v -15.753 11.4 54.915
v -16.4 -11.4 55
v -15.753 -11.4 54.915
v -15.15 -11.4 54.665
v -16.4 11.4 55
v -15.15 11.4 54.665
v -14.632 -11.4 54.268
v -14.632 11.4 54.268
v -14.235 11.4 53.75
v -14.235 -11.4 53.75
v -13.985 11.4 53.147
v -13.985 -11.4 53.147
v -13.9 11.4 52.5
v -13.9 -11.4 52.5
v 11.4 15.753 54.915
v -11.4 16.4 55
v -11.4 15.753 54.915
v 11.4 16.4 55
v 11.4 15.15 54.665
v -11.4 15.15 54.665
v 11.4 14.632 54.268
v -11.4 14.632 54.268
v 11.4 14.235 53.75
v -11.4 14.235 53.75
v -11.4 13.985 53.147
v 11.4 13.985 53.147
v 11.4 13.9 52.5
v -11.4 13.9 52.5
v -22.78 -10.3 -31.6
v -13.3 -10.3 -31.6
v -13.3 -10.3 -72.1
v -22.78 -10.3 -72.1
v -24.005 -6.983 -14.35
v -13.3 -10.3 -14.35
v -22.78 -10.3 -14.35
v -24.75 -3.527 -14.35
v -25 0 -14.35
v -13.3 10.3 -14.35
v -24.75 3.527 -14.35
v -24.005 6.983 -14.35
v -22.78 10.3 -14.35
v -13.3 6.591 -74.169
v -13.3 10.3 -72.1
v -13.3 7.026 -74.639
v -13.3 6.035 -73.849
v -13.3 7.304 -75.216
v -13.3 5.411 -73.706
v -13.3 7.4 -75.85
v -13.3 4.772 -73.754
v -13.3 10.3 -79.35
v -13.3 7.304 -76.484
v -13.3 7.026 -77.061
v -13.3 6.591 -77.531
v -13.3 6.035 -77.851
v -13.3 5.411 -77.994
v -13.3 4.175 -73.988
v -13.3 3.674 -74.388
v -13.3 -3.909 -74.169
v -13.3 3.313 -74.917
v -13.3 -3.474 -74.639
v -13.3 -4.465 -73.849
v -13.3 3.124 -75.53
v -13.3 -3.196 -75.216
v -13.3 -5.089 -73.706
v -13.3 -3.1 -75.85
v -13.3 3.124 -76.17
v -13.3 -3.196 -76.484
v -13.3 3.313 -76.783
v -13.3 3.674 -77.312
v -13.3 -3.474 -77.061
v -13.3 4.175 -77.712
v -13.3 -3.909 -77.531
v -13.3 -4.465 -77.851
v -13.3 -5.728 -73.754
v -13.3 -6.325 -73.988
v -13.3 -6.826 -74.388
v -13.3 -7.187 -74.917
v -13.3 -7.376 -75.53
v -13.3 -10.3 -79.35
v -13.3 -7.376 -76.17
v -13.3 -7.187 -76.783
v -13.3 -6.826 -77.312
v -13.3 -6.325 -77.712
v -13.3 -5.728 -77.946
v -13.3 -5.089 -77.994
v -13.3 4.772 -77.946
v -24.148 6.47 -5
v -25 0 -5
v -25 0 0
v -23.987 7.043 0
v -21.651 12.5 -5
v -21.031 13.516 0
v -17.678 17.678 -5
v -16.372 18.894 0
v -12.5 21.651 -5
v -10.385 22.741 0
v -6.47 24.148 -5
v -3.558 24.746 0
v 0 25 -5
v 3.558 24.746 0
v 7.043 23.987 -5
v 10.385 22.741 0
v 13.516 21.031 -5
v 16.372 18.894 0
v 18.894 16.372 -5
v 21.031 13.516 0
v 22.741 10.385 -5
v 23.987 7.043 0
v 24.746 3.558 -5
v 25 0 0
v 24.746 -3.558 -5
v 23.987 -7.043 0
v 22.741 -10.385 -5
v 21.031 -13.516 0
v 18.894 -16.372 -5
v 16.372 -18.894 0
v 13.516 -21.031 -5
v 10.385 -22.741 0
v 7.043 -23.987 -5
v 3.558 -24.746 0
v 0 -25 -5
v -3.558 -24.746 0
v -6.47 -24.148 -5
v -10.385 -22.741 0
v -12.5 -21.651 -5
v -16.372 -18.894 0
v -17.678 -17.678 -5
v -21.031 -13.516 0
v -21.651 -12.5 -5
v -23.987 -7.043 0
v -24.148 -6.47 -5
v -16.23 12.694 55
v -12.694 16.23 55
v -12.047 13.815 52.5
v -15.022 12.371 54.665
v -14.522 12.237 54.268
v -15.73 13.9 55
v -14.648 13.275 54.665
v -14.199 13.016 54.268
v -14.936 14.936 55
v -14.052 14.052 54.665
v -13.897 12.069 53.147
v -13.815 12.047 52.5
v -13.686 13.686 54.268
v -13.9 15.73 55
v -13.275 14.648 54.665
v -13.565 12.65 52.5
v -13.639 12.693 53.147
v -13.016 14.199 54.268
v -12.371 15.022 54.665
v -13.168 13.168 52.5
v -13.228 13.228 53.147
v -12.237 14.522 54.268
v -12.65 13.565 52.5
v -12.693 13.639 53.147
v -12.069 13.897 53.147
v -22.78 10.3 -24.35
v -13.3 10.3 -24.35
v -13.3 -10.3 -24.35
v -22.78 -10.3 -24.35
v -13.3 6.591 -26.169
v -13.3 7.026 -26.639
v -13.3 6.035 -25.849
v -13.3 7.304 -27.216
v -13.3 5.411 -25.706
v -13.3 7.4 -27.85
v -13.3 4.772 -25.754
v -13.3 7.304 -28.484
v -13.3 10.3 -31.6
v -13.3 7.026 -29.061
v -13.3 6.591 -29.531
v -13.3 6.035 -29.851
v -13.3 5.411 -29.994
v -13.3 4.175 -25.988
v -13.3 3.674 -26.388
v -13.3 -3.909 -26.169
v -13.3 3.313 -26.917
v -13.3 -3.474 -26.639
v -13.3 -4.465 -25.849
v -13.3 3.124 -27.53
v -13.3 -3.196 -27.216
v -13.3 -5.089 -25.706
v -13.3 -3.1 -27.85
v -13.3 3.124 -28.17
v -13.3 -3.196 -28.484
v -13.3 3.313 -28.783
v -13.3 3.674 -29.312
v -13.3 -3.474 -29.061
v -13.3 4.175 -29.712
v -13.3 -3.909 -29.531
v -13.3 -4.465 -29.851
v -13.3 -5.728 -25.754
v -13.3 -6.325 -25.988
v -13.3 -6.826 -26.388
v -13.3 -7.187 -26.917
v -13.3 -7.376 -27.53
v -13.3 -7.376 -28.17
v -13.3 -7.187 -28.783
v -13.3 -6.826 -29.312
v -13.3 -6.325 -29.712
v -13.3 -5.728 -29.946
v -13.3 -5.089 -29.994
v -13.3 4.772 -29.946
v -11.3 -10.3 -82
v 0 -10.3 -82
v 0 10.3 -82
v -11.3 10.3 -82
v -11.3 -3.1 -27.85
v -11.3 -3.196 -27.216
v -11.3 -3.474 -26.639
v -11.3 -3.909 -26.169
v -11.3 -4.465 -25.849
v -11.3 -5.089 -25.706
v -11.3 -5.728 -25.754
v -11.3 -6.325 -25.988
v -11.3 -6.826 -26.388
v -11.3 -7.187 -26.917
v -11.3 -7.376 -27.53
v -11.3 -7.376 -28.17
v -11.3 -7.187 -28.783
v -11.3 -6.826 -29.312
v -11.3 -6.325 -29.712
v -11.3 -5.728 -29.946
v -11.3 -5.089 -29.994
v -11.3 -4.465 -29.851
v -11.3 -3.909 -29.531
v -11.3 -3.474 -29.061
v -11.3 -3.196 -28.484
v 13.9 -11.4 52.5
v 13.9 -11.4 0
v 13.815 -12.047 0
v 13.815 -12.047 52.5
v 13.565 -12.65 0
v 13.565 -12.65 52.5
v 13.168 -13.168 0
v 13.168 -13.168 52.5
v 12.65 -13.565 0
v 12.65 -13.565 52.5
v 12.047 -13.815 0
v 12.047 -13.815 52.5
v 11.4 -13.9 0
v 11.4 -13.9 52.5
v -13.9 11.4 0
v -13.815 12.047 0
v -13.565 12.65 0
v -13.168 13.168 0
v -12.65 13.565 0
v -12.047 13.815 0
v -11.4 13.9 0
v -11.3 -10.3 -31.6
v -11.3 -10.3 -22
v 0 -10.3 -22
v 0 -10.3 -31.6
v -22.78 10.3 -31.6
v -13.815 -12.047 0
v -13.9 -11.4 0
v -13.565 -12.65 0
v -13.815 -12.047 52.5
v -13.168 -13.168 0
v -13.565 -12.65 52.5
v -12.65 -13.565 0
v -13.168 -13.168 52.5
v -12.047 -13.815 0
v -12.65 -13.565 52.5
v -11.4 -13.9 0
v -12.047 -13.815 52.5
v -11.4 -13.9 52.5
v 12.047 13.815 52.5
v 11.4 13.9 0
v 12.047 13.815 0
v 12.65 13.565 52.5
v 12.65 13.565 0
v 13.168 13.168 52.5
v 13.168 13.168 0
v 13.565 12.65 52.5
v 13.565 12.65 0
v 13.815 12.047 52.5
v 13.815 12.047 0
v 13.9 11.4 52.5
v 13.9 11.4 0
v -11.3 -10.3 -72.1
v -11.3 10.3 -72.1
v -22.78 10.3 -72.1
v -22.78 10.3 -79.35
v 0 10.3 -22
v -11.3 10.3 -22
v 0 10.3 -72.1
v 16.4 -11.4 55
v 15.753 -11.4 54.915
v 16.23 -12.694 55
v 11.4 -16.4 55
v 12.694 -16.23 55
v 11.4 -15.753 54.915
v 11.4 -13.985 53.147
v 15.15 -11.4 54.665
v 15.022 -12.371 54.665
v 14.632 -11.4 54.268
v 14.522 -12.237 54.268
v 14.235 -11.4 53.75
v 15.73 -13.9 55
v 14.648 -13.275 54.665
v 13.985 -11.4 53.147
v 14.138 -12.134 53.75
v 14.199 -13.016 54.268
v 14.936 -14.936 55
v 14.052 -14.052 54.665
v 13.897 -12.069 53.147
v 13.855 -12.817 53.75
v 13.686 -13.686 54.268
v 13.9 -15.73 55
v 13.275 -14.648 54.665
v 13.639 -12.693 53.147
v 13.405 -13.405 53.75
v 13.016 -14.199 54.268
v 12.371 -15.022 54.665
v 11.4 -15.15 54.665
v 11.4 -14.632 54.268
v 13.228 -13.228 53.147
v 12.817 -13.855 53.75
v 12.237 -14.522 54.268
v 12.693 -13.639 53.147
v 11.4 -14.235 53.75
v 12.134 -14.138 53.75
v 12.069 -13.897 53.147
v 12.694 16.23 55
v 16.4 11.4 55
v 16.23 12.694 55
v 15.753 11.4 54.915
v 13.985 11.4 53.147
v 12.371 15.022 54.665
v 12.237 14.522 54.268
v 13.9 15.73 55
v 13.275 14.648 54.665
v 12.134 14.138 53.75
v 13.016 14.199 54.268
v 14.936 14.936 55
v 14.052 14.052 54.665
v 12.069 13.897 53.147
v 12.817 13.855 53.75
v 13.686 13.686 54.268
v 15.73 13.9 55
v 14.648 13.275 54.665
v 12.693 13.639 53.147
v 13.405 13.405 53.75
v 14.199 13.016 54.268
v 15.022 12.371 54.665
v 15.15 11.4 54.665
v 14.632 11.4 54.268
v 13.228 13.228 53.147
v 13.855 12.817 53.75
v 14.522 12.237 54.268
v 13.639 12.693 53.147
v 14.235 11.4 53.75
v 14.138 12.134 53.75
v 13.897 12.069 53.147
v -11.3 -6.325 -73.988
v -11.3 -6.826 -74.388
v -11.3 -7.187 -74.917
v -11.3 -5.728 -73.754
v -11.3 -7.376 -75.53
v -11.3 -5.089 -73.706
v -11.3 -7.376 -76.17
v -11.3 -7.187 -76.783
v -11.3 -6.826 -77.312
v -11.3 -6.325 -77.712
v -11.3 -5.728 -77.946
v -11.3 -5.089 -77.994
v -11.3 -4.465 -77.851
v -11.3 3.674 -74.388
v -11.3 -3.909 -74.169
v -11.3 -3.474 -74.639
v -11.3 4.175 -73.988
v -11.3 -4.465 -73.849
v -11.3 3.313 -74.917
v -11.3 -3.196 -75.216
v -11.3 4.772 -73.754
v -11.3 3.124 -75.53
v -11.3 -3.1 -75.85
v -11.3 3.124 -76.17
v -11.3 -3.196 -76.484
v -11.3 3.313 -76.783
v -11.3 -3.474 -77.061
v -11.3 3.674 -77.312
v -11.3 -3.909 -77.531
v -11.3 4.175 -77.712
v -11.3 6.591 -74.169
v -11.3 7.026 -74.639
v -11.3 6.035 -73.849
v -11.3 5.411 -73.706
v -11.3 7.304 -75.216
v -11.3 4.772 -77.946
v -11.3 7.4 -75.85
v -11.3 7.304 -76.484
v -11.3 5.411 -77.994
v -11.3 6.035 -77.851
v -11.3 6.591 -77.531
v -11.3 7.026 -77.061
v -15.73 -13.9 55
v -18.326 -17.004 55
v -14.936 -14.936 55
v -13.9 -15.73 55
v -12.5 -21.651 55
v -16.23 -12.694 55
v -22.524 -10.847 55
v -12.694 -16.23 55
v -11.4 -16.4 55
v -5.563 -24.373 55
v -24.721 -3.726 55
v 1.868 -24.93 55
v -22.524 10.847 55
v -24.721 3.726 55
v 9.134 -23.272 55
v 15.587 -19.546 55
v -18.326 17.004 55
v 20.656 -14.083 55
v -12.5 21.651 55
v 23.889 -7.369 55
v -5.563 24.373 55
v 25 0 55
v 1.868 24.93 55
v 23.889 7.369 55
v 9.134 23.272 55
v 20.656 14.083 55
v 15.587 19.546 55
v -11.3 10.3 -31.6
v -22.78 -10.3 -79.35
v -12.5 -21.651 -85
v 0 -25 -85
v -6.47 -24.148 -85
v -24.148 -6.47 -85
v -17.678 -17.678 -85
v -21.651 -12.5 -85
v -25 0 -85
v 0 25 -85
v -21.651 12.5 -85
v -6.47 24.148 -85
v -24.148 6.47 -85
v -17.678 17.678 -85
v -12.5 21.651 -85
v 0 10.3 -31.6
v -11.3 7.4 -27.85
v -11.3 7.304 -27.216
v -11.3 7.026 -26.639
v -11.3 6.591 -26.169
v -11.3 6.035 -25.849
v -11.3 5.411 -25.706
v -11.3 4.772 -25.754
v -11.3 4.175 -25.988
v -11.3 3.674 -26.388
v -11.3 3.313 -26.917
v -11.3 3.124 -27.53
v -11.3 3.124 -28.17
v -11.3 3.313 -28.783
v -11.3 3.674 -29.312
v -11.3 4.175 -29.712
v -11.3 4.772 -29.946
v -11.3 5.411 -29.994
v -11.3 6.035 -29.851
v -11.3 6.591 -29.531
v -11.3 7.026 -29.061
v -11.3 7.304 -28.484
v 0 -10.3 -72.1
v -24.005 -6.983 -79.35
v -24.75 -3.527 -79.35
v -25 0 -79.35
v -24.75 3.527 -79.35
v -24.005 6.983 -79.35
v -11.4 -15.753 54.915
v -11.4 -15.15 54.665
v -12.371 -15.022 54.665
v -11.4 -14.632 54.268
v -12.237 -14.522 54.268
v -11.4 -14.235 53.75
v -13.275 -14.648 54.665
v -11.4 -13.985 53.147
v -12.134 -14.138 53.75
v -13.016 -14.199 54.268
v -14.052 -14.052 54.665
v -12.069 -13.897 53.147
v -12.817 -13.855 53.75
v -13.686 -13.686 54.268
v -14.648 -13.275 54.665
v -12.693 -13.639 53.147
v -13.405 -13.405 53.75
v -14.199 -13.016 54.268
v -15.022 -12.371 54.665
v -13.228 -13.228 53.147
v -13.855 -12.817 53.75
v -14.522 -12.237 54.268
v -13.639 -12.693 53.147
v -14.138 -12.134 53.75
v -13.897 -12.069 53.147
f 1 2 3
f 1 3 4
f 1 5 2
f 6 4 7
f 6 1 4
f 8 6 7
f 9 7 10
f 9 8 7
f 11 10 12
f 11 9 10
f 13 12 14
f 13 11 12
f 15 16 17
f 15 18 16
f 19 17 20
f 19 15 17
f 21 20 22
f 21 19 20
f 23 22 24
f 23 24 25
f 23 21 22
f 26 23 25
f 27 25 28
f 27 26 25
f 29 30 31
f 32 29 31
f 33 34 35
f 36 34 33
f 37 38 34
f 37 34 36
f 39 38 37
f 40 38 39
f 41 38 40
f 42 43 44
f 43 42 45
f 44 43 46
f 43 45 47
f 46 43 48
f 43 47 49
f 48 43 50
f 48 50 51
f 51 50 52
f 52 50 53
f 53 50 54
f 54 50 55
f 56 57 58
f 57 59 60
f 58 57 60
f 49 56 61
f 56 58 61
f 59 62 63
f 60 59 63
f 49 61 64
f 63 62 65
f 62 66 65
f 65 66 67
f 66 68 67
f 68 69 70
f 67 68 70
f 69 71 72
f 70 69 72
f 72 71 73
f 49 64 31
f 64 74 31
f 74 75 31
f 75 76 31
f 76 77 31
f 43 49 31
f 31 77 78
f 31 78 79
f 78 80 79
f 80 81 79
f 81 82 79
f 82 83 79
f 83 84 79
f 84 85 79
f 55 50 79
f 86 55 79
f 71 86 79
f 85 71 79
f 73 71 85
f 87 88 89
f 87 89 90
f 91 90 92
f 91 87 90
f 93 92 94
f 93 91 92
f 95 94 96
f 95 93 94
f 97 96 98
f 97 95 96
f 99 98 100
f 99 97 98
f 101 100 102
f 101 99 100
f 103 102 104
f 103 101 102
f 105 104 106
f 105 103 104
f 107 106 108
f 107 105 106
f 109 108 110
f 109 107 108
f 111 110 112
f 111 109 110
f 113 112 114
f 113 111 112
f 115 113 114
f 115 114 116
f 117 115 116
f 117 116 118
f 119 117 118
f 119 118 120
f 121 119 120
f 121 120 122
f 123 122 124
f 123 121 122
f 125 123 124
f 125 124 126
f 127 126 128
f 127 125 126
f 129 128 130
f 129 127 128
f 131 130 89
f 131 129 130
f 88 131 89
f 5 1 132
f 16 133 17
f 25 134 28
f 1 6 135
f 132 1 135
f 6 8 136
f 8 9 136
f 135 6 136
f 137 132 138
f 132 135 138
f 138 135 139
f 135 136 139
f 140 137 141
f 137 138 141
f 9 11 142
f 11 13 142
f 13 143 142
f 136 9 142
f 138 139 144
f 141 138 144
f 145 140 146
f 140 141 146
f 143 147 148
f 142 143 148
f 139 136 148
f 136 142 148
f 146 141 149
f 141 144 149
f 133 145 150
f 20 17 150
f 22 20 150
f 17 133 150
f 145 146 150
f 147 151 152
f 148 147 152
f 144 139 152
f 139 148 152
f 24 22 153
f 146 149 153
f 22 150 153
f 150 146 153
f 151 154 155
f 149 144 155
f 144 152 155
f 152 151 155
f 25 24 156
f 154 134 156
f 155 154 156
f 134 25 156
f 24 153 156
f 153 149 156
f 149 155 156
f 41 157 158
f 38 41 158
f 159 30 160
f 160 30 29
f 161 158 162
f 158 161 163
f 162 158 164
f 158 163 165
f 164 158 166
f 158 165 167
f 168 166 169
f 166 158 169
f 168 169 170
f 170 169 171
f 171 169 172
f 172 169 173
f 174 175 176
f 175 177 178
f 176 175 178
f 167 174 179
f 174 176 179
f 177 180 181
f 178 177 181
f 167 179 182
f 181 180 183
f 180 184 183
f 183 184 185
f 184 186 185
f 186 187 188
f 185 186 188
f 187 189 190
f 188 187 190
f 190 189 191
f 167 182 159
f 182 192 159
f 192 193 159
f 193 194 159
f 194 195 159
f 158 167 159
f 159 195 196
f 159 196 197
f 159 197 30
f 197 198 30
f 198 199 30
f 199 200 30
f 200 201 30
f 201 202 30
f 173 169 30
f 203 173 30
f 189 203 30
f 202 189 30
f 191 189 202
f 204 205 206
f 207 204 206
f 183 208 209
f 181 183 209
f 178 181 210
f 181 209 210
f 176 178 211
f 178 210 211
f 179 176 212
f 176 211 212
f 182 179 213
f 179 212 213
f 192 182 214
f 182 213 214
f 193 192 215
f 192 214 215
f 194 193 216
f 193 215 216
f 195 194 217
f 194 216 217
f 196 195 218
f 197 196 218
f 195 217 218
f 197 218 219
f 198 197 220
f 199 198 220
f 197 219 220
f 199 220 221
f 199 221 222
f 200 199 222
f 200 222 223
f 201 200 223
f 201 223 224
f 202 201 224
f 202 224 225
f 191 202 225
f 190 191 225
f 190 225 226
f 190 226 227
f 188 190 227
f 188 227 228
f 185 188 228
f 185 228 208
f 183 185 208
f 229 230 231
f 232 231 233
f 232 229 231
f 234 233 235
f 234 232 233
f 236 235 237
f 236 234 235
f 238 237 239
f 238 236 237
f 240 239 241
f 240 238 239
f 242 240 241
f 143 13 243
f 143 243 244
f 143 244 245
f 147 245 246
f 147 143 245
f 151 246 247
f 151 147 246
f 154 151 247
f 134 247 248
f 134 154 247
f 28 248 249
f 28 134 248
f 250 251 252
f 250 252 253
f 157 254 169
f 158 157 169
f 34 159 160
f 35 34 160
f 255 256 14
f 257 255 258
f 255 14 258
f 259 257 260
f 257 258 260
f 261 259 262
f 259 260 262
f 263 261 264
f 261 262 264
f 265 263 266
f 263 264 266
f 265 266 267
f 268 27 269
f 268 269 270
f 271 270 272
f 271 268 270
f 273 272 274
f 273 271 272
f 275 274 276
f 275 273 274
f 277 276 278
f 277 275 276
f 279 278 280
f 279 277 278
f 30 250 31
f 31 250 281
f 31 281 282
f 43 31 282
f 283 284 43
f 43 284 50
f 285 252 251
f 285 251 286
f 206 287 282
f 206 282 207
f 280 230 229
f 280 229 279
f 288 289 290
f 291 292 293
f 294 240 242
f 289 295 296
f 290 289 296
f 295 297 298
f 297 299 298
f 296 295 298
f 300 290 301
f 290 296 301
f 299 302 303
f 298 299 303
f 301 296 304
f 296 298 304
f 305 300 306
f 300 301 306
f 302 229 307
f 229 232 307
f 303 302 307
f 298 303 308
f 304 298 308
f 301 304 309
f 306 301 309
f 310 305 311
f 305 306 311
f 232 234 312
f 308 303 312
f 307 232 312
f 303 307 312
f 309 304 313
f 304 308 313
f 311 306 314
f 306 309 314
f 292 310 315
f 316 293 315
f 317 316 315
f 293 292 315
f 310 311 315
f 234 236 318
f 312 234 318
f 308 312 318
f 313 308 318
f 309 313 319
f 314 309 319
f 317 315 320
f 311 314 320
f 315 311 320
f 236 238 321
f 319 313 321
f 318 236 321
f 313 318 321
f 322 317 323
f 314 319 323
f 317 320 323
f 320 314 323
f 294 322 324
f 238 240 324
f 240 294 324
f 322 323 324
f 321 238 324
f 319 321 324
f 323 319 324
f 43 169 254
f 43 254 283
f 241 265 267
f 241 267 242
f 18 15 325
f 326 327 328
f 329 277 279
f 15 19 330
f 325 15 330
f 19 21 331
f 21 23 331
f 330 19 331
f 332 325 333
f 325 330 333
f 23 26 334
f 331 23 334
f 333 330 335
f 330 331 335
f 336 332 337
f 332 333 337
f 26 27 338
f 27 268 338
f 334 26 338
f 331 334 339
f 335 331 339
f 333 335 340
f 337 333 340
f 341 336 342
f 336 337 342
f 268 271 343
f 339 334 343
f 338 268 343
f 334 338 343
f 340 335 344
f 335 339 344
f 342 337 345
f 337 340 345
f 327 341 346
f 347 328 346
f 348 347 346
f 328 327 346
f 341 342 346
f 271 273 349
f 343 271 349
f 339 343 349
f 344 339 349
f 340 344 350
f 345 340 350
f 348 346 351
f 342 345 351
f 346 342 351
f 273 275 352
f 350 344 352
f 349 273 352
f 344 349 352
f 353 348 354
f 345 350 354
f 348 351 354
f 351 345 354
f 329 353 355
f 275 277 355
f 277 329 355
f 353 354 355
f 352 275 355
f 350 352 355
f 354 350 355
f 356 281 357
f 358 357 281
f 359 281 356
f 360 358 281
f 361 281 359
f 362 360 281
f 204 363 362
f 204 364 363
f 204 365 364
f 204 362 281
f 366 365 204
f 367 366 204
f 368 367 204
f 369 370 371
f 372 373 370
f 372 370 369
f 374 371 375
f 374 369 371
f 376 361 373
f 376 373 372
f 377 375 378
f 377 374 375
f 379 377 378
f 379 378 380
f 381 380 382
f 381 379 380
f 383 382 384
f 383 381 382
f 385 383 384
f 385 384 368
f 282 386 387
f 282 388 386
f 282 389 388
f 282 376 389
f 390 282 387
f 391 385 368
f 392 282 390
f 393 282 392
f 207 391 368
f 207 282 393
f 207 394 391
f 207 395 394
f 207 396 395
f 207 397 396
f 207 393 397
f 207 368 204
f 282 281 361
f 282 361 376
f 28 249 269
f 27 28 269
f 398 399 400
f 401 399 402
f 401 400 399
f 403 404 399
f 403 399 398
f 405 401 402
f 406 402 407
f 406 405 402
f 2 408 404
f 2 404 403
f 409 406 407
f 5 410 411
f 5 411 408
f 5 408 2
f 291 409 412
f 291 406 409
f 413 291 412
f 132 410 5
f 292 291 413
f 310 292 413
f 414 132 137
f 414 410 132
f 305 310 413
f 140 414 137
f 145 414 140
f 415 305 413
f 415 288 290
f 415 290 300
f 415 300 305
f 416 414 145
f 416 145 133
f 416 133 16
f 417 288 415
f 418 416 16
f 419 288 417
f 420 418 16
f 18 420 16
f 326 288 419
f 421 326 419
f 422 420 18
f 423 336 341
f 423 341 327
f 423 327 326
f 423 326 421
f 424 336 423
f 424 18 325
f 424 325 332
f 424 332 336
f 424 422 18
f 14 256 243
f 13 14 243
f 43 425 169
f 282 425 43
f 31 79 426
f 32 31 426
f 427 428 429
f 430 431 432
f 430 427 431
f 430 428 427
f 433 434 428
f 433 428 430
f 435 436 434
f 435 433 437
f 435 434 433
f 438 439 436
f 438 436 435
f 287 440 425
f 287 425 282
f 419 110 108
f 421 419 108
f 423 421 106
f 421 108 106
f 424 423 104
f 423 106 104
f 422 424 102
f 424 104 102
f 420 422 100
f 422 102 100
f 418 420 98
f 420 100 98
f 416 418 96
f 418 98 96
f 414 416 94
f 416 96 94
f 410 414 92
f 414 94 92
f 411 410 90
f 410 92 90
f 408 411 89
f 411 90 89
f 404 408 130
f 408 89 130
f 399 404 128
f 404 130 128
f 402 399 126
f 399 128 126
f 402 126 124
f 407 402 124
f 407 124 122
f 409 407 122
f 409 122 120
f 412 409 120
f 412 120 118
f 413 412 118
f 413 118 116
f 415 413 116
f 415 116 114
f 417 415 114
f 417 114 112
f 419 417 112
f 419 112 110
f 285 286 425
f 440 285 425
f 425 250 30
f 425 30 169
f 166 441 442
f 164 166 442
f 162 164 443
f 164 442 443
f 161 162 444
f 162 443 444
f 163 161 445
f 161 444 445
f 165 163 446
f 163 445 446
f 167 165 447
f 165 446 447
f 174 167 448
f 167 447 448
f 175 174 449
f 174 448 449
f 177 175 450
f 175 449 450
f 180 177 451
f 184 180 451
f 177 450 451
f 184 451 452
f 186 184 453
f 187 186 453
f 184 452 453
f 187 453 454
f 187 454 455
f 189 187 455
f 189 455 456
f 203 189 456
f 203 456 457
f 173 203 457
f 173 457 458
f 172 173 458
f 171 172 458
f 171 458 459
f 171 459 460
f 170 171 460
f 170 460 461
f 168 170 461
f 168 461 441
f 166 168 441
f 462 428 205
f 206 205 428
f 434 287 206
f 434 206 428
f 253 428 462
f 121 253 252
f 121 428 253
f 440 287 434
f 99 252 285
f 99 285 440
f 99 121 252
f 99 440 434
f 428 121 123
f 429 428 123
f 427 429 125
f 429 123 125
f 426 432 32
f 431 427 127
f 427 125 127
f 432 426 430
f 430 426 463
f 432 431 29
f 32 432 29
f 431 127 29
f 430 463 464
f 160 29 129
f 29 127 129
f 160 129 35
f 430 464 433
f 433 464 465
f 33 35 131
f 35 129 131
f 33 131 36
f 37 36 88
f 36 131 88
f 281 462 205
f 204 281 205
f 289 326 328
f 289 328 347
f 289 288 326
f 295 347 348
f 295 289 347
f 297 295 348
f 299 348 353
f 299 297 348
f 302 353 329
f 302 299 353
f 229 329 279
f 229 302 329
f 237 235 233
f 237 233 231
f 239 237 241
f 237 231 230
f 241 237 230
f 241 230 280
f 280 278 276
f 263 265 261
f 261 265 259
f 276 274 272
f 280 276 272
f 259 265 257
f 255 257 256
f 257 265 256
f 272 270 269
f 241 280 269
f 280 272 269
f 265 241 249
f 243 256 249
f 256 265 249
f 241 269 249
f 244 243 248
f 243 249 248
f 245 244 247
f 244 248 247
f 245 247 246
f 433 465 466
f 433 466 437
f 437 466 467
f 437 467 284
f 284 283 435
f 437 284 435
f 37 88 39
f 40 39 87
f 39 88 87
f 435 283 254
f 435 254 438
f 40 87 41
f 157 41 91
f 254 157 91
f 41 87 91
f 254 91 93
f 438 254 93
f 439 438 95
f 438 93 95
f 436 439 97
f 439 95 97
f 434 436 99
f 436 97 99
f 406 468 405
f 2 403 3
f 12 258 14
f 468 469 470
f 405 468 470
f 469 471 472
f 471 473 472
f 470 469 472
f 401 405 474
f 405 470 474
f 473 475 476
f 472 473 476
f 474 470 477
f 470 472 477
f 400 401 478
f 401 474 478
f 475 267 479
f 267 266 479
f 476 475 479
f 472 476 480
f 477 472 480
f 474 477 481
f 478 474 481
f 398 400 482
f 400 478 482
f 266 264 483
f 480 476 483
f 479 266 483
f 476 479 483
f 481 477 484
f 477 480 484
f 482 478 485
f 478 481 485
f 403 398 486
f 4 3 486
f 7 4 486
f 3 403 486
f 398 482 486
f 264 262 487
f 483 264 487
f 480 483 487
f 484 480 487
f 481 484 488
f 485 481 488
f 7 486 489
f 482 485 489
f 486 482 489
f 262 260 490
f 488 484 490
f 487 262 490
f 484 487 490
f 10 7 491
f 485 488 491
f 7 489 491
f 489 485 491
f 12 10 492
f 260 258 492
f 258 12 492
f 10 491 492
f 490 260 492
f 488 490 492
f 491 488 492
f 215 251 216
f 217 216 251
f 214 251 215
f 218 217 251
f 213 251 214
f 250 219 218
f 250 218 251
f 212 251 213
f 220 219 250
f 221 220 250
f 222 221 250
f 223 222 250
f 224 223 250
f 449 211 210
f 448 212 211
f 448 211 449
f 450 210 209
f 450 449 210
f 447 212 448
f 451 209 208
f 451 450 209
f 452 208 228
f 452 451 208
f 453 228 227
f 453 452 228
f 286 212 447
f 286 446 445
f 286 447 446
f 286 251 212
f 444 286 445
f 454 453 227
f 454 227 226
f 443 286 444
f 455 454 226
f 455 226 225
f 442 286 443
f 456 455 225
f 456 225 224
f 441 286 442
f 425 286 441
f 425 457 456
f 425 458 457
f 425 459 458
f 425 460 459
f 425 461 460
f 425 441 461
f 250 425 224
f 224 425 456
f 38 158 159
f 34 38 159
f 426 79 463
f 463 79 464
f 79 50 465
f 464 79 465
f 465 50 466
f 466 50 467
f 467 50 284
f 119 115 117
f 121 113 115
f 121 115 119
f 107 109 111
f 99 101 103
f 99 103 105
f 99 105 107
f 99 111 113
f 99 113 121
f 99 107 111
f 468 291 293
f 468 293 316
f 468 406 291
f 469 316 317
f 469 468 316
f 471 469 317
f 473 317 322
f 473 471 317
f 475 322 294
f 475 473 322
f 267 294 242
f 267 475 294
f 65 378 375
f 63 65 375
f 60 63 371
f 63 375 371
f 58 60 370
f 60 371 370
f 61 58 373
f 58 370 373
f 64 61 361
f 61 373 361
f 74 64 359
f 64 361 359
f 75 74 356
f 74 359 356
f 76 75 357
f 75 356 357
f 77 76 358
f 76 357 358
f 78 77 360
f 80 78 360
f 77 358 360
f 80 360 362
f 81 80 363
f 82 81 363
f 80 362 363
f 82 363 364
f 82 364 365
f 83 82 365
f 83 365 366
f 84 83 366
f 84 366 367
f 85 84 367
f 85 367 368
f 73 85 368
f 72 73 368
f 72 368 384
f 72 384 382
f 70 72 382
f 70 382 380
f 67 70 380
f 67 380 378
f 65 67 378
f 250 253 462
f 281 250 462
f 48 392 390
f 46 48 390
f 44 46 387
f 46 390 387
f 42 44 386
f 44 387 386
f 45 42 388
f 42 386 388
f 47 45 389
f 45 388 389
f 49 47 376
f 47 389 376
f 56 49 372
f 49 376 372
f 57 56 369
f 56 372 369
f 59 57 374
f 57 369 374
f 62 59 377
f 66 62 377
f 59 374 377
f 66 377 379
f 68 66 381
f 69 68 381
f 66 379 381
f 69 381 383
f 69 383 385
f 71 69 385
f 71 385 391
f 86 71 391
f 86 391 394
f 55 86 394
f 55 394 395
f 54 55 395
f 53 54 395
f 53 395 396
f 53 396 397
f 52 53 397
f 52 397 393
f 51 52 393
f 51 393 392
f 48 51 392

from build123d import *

# Parameters (mm, degrees)
SKETCH1_R           = 25
SKETCH1_W           = 27.8
SKETCH1_H           = 27.8
BOSS_EXTRUDE1_DEPTH = 55
BOSS_EXTRUDE2_START = 5
SKETCH2_R           = 25
SKETCH2_W           = 27.8
SKETCH2_H           = 27.8
BOSS_EXTRUDE2_DEPTH = 5
SKETCH3_W           = 25
SKETCH3_H           = 50
BOSS_EXTRUDE3_DEPTH = 80
FILLET1_R           = 2.5
FILLET2_R           = 2.5
SKETCH21_W          = 60
SKETCH21_H          = 20.6
CUT_EXTRUDE1_DEPTH  = 11.3
SKETCH22_W          = 40.5
SKETCH22_H          = 20.6
CUT_EXTRUDE2_DEPTH  = 93.059763198
CUT_EXTRUDE3_DEPTH  = 88.464278423
SKETCH23_R          = 2.15
CUT_EXTRUDE4_DEPTH  = 93.059763198
CUT_EXTRUDE7_DEPTH  = 27.5
CUT_EXTRUDE8_DEPTH  = 10


with BuildPart() as part:
    # Sketch1 → Boss-Extrude1 (new body)
    with BuildSketch(Plane.XY):
        Circle(SKETCH1_R)
        Rectangle(SKETCH1_W, SKETCH1_H, mode=Mode.SUBTRACT)
    extrude(amount=BOSS_EXTRUDE1_DEPTH)

    # Sketch2 → Boss-Extrude2 (add)
    # profile 1 of 2: a face of its own
    with BuildSketch(Plane(origin=(0, 0, 0), x_dir=(-1, 0, 0), z_dir=(0, 0, -1)).offset(BOSS_EXTRUDE2_START)):
        Circle(SKETCH2_R)
        Rectangle(SKETCH2_W, SKETCH2_H, mode=Mode.SUBTRACT)
    # profile 2 of 2: a face of its own
    with BuildSketch(Plane(origin=(0, 0, 0), x_dir=(-1, 0, 0), z_dir=(0, 0, -1)).offset(BOSS_EXTRUDE2_START)):
        Rectangle(SKETCH2_W, SKETCH2_H)
    extrude(amount=-BOSS_EXTRUDE2_DEPTH)

    # Sketch3 → Boss-Extrude3 (add)
    with BuildSketch(Plane(origin=(0, 0, -5), x_dir=(-1, 0, 0), z_dir=(0, 0, -1))):
        with Locations((12.5, 0)):
            Rectangle(SKETCH3_W, SKETCH3_H)
    extrude(amount=BOSS_EXTRUDE3_DEPTH)

    # Fillet1
    fillet1_edges = [part.edges().sort_by_distance(p)[0] for p in [
        (-13.9, 13.9, 27.5),
        (-13.9, -13.9, 27.5),
        (13.9, -13.9, 27.5),
        (13.9, 13.9, 27.5),
    ]]
    fillet(fillet1_edges, radius=FILLET1_R)

    # Fillet2
    fillet2_edges = [part.edges().sort_by_distance(p)[0] for p in [
        (0, 13.9, 55),
        (-13.9, 0, 55),
        (0, -13.9, 55),
        (13.9, 0, 55),
        (-13.167766953, 13.167766953, 55),
        (-13.167766953, -13.167766953, 55),
        (13.167766953, -13.167766953, 55),
        (13.167766953, 13.167766953, 55),
    ]]
    fillet(fillet2_edges, radius=FILLET2_R)

    # Sketch21 → Cut-Extrude1 (cut)
    with BuildSketch(Plane(origin=(0, 0, 0), x_dir=(0, 0, -1), z_dir=(1, 0, 0))):
        with Locations((52, 0)):
            Rectangle(SKETCH21_W, SKETCH21_H)
    extrude(amount=-CUT_EXTRUDE1_DEPTH, mode=Mode.SUBTRACT)

    # Sketch22 → Cut-Extrude2 (cut, through all)
    with BuildSketch(Plane(origin=(0, 0, 0), x_dir=(0, 0, -1), z_dir=(1, 0, 0))):
        with Locations((51.85, 0)):
            Rectangle(SKETCH22_W, SKETCH22_H)
    extrude(amount=-CUT_EXTRUDE2_DEPTH, mode=Mode.SUBTRACT)

    # Sketch18 → Cut-Extrude3 (cut, through all)
    with BuildSketch(Plane.XY.offset(-5)):
        with BuildLine():
            Line((-25, -25), (0, -25))
            ThreePointArc((0, -25), (-17.67766953, -17.67766953), (-25, 0))
            Line((-25, 0), (-25, -25))
        make_face()
        with BuildLine():
            Line((-25, 25), (-25, 0))
            ThreePointArc((-25, 0), (-17.67766953, 17.67766953), (0, 25))
            Line((0, 25), (-25, 25))
        make_face()
    extrude(amount=-CUT_EXTRUDE3_DEPTH, mode=Mode.SUBTRACT)

    # Sketch23 → Cut-Extrude4 (cut, through all)
    with BuildSketch(Plane(origin=(0, 0, 0), x_dir=(0, 0, -1), z_dir=(1, 0, 0))):
        with Locations(Location((27.85, -5.25, 0), (0, 0, 90))):
            Circle(SKETCH23_R)
        with Locations(Location((75.85, 5.25, 0), (0, 0, 90))):
            Circle(SKETCH23_R)
        with Locations(Location((75.85, -5.25, 0), (0, 0, 90))):
            Circle(SKETCH23_R)
        with Locations(Location((27.85, 5.25, 0), (0, 0, 90))):
            Circle(SKETCH23_R)
    extrude(amount=-CUT_EXTRUDE4_DEPTH, mode=Mode.SUBTRACT)

    # Sketch24 → Cut-Extrude7 (cut, symmetric)
    with BuildSketch(Plane(origin=(0, 0, -51.85), x_dir=(-1, 0, 0), z_dir=(0, 0, -1))):
        with BuildLine():
            Line((22.779596133, 10.3), (13.3, 10.3))
            Line((13.3, 10.3), (13.3, -10.3))
            Line((13.3, -10.3), (22.779596133, -10.3))
            ThreePointArc((22.779596133, -10.3), (25, 0), (22.779596133, 10.3))
        make_face()
    extrude(amount=CUT_EXTRUDE7_DEPTH, both=True, mode=Mode.SUBTRACT)

    # Sketch25 → Cut-Extrude8 (cut)
    with BuildSketch(Plane(origin=(0, 0, -24.35), x_dir=(-1, 0, 0), z_dir=(0, 0, -1))):
        with BuildLine():
            Line((13.3, -10.3), (22.779596133, -10.3))
            ThreePointArc((22.779596133, -10.3), (25, 0), (22.779596133, 10.3))
            Line((22.779596133, 10.3), (13.3, 10.3))
            Line((13.3, 10.3), (13.3, -10.3))
        make_face()
    extrude(amount=-CUT_EXTRUDE8_DEPTH, mode=Mode.SUBTRACT)


solid = part.part
